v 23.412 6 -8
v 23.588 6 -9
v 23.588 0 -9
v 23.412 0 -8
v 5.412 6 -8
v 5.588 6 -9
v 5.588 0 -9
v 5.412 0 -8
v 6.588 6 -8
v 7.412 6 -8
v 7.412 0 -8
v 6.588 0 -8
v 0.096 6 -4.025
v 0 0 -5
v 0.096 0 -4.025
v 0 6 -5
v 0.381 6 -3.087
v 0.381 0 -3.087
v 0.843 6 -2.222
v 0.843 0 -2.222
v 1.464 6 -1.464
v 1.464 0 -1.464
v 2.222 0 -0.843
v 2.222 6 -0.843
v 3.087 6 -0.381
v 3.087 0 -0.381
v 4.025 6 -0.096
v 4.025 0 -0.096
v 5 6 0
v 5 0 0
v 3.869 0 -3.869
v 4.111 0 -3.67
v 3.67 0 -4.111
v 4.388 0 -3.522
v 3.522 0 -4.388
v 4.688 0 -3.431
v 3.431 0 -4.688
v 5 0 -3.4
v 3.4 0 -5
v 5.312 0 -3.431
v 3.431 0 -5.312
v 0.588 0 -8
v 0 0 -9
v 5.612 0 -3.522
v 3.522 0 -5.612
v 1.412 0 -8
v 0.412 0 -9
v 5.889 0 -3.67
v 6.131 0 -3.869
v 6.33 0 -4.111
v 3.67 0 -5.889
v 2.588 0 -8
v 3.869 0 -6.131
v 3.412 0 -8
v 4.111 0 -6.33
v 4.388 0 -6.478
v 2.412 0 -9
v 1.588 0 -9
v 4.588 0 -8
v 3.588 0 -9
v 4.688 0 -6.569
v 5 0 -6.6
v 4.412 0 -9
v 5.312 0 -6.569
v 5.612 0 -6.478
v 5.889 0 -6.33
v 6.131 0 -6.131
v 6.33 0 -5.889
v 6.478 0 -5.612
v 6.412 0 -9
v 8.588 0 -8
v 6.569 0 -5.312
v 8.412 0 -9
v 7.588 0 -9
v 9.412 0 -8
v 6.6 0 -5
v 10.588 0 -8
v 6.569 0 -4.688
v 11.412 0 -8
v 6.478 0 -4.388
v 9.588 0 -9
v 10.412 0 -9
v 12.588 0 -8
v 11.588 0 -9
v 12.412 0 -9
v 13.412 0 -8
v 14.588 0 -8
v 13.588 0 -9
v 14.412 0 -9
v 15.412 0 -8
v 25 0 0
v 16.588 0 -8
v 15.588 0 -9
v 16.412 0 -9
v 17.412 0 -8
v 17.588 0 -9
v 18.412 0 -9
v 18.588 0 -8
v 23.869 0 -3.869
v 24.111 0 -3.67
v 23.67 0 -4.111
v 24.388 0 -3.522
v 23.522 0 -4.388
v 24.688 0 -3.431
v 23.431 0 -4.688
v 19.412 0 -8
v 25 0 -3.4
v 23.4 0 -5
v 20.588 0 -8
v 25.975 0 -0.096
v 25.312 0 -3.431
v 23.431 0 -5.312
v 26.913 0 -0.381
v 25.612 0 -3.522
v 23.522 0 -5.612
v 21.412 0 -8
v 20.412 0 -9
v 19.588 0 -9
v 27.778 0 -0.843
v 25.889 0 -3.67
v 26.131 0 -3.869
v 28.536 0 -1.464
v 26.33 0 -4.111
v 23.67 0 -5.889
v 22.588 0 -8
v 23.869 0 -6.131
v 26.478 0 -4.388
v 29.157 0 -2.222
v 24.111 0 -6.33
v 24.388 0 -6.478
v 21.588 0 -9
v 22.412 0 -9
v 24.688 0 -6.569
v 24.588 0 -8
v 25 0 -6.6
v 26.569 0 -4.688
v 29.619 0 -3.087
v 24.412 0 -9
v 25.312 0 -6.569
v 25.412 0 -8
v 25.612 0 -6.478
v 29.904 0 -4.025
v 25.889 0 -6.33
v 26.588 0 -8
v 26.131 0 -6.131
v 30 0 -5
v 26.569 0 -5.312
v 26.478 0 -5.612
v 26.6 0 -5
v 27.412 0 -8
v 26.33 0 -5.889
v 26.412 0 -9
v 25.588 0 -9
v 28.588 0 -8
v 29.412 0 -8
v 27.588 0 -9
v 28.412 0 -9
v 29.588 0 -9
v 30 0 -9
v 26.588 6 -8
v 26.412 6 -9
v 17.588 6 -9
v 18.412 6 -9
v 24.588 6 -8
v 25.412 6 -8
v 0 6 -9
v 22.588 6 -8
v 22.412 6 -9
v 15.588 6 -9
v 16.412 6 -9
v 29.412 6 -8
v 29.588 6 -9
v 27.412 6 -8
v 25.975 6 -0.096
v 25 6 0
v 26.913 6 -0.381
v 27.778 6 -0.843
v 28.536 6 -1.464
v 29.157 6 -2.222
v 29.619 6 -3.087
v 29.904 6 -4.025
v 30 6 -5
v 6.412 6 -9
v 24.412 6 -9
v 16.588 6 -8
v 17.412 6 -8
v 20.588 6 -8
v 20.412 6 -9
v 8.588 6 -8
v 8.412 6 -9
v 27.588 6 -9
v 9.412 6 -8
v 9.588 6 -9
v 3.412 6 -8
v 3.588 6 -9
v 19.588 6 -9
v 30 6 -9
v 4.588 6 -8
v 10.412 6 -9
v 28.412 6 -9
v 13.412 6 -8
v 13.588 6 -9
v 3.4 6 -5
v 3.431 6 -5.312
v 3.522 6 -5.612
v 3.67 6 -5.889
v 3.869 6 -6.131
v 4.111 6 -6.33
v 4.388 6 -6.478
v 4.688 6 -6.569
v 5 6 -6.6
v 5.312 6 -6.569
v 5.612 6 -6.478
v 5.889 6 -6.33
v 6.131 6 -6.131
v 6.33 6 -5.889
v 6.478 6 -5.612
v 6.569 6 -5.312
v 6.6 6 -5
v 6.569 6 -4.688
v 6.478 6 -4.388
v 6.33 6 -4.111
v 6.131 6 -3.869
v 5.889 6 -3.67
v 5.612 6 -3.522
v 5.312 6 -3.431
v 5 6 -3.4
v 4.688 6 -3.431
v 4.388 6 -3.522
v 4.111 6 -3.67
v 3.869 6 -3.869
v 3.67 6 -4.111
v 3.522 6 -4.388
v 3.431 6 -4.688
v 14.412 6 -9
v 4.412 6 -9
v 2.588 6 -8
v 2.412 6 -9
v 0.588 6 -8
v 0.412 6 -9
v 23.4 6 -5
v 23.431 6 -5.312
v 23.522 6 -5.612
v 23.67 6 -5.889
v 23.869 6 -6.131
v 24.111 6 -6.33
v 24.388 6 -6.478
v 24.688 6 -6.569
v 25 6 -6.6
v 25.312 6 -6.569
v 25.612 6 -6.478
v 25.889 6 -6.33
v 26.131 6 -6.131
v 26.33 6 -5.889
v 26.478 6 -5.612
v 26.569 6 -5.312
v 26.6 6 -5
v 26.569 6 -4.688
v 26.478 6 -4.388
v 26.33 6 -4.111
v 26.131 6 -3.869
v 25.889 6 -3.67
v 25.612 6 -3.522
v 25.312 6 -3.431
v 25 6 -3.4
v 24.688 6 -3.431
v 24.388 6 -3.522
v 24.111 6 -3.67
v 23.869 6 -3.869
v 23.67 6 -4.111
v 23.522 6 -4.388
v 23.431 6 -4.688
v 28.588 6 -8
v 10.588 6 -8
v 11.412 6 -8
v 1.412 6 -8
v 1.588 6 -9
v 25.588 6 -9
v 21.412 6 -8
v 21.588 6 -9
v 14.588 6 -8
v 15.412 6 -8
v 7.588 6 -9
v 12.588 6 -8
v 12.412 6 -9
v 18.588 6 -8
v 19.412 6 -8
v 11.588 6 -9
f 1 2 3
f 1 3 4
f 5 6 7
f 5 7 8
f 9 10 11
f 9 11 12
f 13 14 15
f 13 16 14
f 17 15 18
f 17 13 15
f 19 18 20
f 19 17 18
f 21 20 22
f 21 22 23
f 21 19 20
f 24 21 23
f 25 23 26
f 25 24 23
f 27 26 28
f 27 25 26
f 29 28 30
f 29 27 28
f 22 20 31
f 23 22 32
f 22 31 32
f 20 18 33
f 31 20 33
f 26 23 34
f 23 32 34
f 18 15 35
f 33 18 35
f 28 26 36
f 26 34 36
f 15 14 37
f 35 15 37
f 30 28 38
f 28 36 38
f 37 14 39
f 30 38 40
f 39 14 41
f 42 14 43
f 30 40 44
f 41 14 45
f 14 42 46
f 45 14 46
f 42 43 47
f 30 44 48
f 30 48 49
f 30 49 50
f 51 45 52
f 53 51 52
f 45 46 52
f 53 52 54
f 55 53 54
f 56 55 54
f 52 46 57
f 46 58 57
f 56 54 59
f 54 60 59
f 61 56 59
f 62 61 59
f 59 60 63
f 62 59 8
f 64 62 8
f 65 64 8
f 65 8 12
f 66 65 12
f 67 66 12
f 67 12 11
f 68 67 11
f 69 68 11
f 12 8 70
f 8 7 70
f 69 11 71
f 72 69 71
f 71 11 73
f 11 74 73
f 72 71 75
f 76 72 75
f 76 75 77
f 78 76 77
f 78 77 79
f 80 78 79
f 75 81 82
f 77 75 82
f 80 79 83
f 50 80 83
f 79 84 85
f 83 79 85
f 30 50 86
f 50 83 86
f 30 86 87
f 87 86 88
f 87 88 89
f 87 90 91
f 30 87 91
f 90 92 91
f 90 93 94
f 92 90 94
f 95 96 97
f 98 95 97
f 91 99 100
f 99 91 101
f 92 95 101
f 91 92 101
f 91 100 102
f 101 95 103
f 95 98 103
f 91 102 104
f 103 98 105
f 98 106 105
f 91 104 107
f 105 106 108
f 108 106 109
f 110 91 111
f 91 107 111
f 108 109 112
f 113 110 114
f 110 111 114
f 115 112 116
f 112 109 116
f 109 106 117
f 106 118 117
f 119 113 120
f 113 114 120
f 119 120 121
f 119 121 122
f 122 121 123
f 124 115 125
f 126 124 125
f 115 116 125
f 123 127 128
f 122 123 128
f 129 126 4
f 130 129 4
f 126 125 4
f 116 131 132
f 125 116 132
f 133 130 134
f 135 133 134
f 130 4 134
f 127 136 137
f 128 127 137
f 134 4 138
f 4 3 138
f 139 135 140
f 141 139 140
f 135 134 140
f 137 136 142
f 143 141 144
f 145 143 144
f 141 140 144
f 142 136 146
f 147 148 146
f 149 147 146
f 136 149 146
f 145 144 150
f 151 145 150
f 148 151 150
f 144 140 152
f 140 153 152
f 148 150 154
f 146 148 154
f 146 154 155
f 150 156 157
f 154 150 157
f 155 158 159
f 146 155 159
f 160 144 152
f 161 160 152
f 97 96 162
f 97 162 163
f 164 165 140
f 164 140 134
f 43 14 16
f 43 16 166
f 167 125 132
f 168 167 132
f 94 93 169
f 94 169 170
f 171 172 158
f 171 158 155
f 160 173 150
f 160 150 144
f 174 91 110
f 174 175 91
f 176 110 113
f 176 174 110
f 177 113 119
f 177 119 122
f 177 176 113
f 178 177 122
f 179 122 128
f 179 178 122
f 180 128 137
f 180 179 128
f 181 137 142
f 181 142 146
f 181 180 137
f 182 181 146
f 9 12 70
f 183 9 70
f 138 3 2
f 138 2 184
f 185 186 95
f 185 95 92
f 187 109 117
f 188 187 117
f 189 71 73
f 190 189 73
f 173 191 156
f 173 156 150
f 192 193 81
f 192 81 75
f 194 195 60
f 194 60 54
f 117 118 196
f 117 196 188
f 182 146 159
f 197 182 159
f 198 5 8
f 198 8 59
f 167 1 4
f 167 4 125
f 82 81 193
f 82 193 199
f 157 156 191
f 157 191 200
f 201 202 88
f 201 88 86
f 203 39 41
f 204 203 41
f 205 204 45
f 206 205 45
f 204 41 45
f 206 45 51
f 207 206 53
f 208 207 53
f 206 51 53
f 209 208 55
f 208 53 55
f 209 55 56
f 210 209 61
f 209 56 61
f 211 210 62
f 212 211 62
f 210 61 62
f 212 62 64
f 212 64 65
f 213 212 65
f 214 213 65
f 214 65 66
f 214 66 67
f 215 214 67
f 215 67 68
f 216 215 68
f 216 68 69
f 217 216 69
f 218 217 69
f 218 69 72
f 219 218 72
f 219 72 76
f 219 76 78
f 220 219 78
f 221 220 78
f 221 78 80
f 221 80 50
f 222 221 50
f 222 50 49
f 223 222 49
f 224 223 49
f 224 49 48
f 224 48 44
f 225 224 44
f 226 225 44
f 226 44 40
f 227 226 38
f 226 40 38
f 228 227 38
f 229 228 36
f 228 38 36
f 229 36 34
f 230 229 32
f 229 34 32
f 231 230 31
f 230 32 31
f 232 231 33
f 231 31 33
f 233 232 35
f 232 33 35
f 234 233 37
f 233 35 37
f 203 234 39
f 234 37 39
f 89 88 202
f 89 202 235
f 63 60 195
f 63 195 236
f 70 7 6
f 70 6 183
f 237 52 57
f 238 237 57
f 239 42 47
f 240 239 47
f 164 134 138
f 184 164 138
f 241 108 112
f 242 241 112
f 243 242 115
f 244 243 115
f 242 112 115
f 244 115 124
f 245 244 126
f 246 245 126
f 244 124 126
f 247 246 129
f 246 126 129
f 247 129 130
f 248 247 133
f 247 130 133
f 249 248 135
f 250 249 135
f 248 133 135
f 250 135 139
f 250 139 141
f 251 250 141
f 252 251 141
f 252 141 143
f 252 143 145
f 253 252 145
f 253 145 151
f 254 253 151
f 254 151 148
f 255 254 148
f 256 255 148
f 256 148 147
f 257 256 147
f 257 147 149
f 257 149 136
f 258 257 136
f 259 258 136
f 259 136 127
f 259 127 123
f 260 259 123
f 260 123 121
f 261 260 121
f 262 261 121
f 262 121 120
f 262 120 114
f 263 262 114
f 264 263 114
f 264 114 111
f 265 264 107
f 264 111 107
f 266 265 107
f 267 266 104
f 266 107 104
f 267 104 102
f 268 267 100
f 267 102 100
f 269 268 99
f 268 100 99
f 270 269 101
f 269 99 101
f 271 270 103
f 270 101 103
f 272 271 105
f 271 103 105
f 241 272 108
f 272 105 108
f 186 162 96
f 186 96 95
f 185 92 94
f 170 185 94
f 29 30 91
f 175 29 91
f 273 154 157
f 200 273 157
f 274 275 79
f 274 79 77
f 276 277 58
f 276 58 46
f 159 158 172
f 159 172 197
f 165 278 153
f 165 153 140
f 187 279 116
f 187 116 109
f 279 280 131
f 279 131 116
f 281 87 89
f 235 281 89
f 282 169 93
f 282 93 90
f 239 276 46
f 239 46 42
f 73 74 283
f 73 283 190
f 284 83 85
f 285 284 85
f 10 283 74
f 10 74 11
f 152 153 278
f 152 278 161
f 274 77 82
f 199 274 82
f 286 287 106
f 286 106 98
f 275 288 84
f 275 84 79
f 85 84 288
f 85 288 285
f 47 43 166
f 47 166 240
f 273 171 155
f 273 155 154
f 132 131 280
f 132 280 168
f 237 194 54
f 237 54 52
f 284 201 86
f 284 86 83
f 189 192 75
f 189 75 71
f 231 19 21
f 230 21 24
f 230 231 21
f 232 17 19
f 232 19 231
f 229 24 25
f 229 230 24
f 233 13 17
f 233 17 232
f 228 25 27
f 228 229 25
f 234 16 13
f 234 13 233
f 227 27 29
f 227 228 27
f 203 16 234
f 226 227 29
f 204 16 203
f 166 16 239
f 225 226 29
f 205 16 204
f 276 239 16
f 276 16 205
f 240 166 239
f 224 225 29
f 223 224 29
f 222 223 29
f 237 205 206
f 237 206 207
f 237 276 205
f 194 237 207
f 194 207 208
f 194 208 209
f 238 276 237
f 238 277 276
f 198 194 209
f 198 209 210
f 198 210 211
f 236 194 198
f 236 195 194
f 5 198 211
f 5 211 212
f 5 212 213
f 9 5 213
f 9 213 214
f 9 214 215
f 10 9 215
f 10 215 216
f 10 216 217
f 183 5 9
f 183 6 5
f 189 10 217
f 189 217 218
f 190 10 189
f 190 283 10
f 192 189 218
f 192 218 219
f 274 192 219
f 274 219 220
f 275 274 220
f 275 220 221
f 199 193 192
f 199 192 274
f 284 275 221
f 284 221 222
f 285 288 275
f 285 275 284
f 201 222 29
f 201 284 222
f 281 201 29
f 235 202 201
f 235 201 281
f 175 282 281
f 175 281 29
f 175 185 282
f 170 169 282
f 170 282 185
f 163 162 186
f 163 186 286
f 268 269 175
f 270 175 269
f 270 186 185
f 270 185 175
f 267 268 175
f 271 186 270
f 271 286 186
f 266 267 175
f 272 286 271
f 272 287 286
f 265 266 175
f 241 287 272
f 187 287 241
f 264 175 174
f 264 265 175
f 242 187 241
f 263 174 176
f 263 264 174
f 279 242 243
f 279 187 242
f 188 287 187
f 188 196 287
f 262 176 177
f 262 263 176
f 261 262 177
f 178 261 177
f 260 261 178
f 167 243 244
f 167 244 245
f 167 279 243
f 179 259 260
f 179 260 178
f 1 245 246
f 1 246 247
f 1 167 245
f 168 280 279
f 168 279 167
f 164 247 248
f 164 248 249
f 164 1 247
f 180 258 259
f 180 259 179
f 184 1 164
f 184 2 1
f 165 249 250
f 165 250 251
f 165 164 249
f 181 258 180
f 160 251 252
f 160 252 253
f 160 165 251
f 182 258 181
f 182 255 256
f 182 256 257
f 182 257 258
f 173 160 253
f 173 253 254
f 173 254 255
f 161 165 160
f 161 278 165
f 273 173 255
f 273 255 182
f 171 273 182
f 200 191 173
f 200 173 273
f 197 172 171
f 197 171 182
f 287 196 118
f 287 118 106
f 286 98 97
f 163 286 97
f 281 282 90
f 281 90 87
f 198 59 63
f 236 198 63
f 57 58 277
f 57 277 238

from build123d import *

# Parameters (mm, degrees)
SKETCH1_W            = 30
SKETCH1_H            = 9
BOSS_EXTRUDE1_DEPTH  = 6
CUT_EXTRUDE1_DEPTH   = 7
LPATTERN2_COUNT      = 8
LPATTERN2_PITCH      = 2
LPATTERN2_COL_COUNT  = 8
LPATTERN2_COL_PITCH  = 2
M3_CLEARANCE_HOLE1_D = 3.2
FILLET1_R            = 5


with BuildPart() as part:
    # Sketch1 → Boss-Extrude1 (new body)
    with BuildSketch(Plane(origin=(0, 0, 0), x_dir=(1, 0, 0), z_dir=(0, 1, 0))):
        with Locations((15, 4.5)):
            Rectangle(SKETCH1_W, SKETCH1_H)
    extrude(amount=BOSS_EXTRUDE1_DEPTH)

    # Sketch2 → Cut-Extrude1 (cut, through all)
    with BuildSketch(Plane(origin=(0, 6, 0), x_dir=(1, 0, 0), z_dir=(0, 1, 0))):
        Polygon((14.41183651, 9), (15.58816349, 9), (15.41183651, 8), (14.58816349, 8), align=None)
    cut_extrude1 = extrude(amount=-CUT_EXTRUDE1_DEPTH, mode=Mode.SUBTRACT)

    # LPattern2: Cut-Extrude1 ×8
    with Locations(*[(-i * LPATTERN2_PITCH, 0, 0) for i in range(1, LPATTERN2_COUNT)]):
        add(cut_extrude1, mode=Mode.SUBTRACT)

    # LPattern2 col: Cut-Extrude1 ×8
    with Locations(*[(i * LPATTERN2_COL_PITCH, 0, 0) for i in range(1, LPATTERN2_COL_COUNT)]):
        add(cut_extrude1, mode=Mode.SUBTRACT)

    # M3 Clearance Hole1 (through all)
    with Locations(Plane(origin=(0, 6, 0), x_dir=(1, 0, 0), z_dir=(0, 1, 0))):
        with Locations((5, 5), (25, 5)):
            Hole(M3_CLEARANCE_HOLE1_D / 2)

    # Fillet1
    fillet1_edges = [part.edges().sort_by_distance(p)[0] for p in [
        (30, 3, 0),
        (0, 3, 0),
    ]]
    fillet(fillet1_edges, radius=FILLET1_R)


solid = part.part
